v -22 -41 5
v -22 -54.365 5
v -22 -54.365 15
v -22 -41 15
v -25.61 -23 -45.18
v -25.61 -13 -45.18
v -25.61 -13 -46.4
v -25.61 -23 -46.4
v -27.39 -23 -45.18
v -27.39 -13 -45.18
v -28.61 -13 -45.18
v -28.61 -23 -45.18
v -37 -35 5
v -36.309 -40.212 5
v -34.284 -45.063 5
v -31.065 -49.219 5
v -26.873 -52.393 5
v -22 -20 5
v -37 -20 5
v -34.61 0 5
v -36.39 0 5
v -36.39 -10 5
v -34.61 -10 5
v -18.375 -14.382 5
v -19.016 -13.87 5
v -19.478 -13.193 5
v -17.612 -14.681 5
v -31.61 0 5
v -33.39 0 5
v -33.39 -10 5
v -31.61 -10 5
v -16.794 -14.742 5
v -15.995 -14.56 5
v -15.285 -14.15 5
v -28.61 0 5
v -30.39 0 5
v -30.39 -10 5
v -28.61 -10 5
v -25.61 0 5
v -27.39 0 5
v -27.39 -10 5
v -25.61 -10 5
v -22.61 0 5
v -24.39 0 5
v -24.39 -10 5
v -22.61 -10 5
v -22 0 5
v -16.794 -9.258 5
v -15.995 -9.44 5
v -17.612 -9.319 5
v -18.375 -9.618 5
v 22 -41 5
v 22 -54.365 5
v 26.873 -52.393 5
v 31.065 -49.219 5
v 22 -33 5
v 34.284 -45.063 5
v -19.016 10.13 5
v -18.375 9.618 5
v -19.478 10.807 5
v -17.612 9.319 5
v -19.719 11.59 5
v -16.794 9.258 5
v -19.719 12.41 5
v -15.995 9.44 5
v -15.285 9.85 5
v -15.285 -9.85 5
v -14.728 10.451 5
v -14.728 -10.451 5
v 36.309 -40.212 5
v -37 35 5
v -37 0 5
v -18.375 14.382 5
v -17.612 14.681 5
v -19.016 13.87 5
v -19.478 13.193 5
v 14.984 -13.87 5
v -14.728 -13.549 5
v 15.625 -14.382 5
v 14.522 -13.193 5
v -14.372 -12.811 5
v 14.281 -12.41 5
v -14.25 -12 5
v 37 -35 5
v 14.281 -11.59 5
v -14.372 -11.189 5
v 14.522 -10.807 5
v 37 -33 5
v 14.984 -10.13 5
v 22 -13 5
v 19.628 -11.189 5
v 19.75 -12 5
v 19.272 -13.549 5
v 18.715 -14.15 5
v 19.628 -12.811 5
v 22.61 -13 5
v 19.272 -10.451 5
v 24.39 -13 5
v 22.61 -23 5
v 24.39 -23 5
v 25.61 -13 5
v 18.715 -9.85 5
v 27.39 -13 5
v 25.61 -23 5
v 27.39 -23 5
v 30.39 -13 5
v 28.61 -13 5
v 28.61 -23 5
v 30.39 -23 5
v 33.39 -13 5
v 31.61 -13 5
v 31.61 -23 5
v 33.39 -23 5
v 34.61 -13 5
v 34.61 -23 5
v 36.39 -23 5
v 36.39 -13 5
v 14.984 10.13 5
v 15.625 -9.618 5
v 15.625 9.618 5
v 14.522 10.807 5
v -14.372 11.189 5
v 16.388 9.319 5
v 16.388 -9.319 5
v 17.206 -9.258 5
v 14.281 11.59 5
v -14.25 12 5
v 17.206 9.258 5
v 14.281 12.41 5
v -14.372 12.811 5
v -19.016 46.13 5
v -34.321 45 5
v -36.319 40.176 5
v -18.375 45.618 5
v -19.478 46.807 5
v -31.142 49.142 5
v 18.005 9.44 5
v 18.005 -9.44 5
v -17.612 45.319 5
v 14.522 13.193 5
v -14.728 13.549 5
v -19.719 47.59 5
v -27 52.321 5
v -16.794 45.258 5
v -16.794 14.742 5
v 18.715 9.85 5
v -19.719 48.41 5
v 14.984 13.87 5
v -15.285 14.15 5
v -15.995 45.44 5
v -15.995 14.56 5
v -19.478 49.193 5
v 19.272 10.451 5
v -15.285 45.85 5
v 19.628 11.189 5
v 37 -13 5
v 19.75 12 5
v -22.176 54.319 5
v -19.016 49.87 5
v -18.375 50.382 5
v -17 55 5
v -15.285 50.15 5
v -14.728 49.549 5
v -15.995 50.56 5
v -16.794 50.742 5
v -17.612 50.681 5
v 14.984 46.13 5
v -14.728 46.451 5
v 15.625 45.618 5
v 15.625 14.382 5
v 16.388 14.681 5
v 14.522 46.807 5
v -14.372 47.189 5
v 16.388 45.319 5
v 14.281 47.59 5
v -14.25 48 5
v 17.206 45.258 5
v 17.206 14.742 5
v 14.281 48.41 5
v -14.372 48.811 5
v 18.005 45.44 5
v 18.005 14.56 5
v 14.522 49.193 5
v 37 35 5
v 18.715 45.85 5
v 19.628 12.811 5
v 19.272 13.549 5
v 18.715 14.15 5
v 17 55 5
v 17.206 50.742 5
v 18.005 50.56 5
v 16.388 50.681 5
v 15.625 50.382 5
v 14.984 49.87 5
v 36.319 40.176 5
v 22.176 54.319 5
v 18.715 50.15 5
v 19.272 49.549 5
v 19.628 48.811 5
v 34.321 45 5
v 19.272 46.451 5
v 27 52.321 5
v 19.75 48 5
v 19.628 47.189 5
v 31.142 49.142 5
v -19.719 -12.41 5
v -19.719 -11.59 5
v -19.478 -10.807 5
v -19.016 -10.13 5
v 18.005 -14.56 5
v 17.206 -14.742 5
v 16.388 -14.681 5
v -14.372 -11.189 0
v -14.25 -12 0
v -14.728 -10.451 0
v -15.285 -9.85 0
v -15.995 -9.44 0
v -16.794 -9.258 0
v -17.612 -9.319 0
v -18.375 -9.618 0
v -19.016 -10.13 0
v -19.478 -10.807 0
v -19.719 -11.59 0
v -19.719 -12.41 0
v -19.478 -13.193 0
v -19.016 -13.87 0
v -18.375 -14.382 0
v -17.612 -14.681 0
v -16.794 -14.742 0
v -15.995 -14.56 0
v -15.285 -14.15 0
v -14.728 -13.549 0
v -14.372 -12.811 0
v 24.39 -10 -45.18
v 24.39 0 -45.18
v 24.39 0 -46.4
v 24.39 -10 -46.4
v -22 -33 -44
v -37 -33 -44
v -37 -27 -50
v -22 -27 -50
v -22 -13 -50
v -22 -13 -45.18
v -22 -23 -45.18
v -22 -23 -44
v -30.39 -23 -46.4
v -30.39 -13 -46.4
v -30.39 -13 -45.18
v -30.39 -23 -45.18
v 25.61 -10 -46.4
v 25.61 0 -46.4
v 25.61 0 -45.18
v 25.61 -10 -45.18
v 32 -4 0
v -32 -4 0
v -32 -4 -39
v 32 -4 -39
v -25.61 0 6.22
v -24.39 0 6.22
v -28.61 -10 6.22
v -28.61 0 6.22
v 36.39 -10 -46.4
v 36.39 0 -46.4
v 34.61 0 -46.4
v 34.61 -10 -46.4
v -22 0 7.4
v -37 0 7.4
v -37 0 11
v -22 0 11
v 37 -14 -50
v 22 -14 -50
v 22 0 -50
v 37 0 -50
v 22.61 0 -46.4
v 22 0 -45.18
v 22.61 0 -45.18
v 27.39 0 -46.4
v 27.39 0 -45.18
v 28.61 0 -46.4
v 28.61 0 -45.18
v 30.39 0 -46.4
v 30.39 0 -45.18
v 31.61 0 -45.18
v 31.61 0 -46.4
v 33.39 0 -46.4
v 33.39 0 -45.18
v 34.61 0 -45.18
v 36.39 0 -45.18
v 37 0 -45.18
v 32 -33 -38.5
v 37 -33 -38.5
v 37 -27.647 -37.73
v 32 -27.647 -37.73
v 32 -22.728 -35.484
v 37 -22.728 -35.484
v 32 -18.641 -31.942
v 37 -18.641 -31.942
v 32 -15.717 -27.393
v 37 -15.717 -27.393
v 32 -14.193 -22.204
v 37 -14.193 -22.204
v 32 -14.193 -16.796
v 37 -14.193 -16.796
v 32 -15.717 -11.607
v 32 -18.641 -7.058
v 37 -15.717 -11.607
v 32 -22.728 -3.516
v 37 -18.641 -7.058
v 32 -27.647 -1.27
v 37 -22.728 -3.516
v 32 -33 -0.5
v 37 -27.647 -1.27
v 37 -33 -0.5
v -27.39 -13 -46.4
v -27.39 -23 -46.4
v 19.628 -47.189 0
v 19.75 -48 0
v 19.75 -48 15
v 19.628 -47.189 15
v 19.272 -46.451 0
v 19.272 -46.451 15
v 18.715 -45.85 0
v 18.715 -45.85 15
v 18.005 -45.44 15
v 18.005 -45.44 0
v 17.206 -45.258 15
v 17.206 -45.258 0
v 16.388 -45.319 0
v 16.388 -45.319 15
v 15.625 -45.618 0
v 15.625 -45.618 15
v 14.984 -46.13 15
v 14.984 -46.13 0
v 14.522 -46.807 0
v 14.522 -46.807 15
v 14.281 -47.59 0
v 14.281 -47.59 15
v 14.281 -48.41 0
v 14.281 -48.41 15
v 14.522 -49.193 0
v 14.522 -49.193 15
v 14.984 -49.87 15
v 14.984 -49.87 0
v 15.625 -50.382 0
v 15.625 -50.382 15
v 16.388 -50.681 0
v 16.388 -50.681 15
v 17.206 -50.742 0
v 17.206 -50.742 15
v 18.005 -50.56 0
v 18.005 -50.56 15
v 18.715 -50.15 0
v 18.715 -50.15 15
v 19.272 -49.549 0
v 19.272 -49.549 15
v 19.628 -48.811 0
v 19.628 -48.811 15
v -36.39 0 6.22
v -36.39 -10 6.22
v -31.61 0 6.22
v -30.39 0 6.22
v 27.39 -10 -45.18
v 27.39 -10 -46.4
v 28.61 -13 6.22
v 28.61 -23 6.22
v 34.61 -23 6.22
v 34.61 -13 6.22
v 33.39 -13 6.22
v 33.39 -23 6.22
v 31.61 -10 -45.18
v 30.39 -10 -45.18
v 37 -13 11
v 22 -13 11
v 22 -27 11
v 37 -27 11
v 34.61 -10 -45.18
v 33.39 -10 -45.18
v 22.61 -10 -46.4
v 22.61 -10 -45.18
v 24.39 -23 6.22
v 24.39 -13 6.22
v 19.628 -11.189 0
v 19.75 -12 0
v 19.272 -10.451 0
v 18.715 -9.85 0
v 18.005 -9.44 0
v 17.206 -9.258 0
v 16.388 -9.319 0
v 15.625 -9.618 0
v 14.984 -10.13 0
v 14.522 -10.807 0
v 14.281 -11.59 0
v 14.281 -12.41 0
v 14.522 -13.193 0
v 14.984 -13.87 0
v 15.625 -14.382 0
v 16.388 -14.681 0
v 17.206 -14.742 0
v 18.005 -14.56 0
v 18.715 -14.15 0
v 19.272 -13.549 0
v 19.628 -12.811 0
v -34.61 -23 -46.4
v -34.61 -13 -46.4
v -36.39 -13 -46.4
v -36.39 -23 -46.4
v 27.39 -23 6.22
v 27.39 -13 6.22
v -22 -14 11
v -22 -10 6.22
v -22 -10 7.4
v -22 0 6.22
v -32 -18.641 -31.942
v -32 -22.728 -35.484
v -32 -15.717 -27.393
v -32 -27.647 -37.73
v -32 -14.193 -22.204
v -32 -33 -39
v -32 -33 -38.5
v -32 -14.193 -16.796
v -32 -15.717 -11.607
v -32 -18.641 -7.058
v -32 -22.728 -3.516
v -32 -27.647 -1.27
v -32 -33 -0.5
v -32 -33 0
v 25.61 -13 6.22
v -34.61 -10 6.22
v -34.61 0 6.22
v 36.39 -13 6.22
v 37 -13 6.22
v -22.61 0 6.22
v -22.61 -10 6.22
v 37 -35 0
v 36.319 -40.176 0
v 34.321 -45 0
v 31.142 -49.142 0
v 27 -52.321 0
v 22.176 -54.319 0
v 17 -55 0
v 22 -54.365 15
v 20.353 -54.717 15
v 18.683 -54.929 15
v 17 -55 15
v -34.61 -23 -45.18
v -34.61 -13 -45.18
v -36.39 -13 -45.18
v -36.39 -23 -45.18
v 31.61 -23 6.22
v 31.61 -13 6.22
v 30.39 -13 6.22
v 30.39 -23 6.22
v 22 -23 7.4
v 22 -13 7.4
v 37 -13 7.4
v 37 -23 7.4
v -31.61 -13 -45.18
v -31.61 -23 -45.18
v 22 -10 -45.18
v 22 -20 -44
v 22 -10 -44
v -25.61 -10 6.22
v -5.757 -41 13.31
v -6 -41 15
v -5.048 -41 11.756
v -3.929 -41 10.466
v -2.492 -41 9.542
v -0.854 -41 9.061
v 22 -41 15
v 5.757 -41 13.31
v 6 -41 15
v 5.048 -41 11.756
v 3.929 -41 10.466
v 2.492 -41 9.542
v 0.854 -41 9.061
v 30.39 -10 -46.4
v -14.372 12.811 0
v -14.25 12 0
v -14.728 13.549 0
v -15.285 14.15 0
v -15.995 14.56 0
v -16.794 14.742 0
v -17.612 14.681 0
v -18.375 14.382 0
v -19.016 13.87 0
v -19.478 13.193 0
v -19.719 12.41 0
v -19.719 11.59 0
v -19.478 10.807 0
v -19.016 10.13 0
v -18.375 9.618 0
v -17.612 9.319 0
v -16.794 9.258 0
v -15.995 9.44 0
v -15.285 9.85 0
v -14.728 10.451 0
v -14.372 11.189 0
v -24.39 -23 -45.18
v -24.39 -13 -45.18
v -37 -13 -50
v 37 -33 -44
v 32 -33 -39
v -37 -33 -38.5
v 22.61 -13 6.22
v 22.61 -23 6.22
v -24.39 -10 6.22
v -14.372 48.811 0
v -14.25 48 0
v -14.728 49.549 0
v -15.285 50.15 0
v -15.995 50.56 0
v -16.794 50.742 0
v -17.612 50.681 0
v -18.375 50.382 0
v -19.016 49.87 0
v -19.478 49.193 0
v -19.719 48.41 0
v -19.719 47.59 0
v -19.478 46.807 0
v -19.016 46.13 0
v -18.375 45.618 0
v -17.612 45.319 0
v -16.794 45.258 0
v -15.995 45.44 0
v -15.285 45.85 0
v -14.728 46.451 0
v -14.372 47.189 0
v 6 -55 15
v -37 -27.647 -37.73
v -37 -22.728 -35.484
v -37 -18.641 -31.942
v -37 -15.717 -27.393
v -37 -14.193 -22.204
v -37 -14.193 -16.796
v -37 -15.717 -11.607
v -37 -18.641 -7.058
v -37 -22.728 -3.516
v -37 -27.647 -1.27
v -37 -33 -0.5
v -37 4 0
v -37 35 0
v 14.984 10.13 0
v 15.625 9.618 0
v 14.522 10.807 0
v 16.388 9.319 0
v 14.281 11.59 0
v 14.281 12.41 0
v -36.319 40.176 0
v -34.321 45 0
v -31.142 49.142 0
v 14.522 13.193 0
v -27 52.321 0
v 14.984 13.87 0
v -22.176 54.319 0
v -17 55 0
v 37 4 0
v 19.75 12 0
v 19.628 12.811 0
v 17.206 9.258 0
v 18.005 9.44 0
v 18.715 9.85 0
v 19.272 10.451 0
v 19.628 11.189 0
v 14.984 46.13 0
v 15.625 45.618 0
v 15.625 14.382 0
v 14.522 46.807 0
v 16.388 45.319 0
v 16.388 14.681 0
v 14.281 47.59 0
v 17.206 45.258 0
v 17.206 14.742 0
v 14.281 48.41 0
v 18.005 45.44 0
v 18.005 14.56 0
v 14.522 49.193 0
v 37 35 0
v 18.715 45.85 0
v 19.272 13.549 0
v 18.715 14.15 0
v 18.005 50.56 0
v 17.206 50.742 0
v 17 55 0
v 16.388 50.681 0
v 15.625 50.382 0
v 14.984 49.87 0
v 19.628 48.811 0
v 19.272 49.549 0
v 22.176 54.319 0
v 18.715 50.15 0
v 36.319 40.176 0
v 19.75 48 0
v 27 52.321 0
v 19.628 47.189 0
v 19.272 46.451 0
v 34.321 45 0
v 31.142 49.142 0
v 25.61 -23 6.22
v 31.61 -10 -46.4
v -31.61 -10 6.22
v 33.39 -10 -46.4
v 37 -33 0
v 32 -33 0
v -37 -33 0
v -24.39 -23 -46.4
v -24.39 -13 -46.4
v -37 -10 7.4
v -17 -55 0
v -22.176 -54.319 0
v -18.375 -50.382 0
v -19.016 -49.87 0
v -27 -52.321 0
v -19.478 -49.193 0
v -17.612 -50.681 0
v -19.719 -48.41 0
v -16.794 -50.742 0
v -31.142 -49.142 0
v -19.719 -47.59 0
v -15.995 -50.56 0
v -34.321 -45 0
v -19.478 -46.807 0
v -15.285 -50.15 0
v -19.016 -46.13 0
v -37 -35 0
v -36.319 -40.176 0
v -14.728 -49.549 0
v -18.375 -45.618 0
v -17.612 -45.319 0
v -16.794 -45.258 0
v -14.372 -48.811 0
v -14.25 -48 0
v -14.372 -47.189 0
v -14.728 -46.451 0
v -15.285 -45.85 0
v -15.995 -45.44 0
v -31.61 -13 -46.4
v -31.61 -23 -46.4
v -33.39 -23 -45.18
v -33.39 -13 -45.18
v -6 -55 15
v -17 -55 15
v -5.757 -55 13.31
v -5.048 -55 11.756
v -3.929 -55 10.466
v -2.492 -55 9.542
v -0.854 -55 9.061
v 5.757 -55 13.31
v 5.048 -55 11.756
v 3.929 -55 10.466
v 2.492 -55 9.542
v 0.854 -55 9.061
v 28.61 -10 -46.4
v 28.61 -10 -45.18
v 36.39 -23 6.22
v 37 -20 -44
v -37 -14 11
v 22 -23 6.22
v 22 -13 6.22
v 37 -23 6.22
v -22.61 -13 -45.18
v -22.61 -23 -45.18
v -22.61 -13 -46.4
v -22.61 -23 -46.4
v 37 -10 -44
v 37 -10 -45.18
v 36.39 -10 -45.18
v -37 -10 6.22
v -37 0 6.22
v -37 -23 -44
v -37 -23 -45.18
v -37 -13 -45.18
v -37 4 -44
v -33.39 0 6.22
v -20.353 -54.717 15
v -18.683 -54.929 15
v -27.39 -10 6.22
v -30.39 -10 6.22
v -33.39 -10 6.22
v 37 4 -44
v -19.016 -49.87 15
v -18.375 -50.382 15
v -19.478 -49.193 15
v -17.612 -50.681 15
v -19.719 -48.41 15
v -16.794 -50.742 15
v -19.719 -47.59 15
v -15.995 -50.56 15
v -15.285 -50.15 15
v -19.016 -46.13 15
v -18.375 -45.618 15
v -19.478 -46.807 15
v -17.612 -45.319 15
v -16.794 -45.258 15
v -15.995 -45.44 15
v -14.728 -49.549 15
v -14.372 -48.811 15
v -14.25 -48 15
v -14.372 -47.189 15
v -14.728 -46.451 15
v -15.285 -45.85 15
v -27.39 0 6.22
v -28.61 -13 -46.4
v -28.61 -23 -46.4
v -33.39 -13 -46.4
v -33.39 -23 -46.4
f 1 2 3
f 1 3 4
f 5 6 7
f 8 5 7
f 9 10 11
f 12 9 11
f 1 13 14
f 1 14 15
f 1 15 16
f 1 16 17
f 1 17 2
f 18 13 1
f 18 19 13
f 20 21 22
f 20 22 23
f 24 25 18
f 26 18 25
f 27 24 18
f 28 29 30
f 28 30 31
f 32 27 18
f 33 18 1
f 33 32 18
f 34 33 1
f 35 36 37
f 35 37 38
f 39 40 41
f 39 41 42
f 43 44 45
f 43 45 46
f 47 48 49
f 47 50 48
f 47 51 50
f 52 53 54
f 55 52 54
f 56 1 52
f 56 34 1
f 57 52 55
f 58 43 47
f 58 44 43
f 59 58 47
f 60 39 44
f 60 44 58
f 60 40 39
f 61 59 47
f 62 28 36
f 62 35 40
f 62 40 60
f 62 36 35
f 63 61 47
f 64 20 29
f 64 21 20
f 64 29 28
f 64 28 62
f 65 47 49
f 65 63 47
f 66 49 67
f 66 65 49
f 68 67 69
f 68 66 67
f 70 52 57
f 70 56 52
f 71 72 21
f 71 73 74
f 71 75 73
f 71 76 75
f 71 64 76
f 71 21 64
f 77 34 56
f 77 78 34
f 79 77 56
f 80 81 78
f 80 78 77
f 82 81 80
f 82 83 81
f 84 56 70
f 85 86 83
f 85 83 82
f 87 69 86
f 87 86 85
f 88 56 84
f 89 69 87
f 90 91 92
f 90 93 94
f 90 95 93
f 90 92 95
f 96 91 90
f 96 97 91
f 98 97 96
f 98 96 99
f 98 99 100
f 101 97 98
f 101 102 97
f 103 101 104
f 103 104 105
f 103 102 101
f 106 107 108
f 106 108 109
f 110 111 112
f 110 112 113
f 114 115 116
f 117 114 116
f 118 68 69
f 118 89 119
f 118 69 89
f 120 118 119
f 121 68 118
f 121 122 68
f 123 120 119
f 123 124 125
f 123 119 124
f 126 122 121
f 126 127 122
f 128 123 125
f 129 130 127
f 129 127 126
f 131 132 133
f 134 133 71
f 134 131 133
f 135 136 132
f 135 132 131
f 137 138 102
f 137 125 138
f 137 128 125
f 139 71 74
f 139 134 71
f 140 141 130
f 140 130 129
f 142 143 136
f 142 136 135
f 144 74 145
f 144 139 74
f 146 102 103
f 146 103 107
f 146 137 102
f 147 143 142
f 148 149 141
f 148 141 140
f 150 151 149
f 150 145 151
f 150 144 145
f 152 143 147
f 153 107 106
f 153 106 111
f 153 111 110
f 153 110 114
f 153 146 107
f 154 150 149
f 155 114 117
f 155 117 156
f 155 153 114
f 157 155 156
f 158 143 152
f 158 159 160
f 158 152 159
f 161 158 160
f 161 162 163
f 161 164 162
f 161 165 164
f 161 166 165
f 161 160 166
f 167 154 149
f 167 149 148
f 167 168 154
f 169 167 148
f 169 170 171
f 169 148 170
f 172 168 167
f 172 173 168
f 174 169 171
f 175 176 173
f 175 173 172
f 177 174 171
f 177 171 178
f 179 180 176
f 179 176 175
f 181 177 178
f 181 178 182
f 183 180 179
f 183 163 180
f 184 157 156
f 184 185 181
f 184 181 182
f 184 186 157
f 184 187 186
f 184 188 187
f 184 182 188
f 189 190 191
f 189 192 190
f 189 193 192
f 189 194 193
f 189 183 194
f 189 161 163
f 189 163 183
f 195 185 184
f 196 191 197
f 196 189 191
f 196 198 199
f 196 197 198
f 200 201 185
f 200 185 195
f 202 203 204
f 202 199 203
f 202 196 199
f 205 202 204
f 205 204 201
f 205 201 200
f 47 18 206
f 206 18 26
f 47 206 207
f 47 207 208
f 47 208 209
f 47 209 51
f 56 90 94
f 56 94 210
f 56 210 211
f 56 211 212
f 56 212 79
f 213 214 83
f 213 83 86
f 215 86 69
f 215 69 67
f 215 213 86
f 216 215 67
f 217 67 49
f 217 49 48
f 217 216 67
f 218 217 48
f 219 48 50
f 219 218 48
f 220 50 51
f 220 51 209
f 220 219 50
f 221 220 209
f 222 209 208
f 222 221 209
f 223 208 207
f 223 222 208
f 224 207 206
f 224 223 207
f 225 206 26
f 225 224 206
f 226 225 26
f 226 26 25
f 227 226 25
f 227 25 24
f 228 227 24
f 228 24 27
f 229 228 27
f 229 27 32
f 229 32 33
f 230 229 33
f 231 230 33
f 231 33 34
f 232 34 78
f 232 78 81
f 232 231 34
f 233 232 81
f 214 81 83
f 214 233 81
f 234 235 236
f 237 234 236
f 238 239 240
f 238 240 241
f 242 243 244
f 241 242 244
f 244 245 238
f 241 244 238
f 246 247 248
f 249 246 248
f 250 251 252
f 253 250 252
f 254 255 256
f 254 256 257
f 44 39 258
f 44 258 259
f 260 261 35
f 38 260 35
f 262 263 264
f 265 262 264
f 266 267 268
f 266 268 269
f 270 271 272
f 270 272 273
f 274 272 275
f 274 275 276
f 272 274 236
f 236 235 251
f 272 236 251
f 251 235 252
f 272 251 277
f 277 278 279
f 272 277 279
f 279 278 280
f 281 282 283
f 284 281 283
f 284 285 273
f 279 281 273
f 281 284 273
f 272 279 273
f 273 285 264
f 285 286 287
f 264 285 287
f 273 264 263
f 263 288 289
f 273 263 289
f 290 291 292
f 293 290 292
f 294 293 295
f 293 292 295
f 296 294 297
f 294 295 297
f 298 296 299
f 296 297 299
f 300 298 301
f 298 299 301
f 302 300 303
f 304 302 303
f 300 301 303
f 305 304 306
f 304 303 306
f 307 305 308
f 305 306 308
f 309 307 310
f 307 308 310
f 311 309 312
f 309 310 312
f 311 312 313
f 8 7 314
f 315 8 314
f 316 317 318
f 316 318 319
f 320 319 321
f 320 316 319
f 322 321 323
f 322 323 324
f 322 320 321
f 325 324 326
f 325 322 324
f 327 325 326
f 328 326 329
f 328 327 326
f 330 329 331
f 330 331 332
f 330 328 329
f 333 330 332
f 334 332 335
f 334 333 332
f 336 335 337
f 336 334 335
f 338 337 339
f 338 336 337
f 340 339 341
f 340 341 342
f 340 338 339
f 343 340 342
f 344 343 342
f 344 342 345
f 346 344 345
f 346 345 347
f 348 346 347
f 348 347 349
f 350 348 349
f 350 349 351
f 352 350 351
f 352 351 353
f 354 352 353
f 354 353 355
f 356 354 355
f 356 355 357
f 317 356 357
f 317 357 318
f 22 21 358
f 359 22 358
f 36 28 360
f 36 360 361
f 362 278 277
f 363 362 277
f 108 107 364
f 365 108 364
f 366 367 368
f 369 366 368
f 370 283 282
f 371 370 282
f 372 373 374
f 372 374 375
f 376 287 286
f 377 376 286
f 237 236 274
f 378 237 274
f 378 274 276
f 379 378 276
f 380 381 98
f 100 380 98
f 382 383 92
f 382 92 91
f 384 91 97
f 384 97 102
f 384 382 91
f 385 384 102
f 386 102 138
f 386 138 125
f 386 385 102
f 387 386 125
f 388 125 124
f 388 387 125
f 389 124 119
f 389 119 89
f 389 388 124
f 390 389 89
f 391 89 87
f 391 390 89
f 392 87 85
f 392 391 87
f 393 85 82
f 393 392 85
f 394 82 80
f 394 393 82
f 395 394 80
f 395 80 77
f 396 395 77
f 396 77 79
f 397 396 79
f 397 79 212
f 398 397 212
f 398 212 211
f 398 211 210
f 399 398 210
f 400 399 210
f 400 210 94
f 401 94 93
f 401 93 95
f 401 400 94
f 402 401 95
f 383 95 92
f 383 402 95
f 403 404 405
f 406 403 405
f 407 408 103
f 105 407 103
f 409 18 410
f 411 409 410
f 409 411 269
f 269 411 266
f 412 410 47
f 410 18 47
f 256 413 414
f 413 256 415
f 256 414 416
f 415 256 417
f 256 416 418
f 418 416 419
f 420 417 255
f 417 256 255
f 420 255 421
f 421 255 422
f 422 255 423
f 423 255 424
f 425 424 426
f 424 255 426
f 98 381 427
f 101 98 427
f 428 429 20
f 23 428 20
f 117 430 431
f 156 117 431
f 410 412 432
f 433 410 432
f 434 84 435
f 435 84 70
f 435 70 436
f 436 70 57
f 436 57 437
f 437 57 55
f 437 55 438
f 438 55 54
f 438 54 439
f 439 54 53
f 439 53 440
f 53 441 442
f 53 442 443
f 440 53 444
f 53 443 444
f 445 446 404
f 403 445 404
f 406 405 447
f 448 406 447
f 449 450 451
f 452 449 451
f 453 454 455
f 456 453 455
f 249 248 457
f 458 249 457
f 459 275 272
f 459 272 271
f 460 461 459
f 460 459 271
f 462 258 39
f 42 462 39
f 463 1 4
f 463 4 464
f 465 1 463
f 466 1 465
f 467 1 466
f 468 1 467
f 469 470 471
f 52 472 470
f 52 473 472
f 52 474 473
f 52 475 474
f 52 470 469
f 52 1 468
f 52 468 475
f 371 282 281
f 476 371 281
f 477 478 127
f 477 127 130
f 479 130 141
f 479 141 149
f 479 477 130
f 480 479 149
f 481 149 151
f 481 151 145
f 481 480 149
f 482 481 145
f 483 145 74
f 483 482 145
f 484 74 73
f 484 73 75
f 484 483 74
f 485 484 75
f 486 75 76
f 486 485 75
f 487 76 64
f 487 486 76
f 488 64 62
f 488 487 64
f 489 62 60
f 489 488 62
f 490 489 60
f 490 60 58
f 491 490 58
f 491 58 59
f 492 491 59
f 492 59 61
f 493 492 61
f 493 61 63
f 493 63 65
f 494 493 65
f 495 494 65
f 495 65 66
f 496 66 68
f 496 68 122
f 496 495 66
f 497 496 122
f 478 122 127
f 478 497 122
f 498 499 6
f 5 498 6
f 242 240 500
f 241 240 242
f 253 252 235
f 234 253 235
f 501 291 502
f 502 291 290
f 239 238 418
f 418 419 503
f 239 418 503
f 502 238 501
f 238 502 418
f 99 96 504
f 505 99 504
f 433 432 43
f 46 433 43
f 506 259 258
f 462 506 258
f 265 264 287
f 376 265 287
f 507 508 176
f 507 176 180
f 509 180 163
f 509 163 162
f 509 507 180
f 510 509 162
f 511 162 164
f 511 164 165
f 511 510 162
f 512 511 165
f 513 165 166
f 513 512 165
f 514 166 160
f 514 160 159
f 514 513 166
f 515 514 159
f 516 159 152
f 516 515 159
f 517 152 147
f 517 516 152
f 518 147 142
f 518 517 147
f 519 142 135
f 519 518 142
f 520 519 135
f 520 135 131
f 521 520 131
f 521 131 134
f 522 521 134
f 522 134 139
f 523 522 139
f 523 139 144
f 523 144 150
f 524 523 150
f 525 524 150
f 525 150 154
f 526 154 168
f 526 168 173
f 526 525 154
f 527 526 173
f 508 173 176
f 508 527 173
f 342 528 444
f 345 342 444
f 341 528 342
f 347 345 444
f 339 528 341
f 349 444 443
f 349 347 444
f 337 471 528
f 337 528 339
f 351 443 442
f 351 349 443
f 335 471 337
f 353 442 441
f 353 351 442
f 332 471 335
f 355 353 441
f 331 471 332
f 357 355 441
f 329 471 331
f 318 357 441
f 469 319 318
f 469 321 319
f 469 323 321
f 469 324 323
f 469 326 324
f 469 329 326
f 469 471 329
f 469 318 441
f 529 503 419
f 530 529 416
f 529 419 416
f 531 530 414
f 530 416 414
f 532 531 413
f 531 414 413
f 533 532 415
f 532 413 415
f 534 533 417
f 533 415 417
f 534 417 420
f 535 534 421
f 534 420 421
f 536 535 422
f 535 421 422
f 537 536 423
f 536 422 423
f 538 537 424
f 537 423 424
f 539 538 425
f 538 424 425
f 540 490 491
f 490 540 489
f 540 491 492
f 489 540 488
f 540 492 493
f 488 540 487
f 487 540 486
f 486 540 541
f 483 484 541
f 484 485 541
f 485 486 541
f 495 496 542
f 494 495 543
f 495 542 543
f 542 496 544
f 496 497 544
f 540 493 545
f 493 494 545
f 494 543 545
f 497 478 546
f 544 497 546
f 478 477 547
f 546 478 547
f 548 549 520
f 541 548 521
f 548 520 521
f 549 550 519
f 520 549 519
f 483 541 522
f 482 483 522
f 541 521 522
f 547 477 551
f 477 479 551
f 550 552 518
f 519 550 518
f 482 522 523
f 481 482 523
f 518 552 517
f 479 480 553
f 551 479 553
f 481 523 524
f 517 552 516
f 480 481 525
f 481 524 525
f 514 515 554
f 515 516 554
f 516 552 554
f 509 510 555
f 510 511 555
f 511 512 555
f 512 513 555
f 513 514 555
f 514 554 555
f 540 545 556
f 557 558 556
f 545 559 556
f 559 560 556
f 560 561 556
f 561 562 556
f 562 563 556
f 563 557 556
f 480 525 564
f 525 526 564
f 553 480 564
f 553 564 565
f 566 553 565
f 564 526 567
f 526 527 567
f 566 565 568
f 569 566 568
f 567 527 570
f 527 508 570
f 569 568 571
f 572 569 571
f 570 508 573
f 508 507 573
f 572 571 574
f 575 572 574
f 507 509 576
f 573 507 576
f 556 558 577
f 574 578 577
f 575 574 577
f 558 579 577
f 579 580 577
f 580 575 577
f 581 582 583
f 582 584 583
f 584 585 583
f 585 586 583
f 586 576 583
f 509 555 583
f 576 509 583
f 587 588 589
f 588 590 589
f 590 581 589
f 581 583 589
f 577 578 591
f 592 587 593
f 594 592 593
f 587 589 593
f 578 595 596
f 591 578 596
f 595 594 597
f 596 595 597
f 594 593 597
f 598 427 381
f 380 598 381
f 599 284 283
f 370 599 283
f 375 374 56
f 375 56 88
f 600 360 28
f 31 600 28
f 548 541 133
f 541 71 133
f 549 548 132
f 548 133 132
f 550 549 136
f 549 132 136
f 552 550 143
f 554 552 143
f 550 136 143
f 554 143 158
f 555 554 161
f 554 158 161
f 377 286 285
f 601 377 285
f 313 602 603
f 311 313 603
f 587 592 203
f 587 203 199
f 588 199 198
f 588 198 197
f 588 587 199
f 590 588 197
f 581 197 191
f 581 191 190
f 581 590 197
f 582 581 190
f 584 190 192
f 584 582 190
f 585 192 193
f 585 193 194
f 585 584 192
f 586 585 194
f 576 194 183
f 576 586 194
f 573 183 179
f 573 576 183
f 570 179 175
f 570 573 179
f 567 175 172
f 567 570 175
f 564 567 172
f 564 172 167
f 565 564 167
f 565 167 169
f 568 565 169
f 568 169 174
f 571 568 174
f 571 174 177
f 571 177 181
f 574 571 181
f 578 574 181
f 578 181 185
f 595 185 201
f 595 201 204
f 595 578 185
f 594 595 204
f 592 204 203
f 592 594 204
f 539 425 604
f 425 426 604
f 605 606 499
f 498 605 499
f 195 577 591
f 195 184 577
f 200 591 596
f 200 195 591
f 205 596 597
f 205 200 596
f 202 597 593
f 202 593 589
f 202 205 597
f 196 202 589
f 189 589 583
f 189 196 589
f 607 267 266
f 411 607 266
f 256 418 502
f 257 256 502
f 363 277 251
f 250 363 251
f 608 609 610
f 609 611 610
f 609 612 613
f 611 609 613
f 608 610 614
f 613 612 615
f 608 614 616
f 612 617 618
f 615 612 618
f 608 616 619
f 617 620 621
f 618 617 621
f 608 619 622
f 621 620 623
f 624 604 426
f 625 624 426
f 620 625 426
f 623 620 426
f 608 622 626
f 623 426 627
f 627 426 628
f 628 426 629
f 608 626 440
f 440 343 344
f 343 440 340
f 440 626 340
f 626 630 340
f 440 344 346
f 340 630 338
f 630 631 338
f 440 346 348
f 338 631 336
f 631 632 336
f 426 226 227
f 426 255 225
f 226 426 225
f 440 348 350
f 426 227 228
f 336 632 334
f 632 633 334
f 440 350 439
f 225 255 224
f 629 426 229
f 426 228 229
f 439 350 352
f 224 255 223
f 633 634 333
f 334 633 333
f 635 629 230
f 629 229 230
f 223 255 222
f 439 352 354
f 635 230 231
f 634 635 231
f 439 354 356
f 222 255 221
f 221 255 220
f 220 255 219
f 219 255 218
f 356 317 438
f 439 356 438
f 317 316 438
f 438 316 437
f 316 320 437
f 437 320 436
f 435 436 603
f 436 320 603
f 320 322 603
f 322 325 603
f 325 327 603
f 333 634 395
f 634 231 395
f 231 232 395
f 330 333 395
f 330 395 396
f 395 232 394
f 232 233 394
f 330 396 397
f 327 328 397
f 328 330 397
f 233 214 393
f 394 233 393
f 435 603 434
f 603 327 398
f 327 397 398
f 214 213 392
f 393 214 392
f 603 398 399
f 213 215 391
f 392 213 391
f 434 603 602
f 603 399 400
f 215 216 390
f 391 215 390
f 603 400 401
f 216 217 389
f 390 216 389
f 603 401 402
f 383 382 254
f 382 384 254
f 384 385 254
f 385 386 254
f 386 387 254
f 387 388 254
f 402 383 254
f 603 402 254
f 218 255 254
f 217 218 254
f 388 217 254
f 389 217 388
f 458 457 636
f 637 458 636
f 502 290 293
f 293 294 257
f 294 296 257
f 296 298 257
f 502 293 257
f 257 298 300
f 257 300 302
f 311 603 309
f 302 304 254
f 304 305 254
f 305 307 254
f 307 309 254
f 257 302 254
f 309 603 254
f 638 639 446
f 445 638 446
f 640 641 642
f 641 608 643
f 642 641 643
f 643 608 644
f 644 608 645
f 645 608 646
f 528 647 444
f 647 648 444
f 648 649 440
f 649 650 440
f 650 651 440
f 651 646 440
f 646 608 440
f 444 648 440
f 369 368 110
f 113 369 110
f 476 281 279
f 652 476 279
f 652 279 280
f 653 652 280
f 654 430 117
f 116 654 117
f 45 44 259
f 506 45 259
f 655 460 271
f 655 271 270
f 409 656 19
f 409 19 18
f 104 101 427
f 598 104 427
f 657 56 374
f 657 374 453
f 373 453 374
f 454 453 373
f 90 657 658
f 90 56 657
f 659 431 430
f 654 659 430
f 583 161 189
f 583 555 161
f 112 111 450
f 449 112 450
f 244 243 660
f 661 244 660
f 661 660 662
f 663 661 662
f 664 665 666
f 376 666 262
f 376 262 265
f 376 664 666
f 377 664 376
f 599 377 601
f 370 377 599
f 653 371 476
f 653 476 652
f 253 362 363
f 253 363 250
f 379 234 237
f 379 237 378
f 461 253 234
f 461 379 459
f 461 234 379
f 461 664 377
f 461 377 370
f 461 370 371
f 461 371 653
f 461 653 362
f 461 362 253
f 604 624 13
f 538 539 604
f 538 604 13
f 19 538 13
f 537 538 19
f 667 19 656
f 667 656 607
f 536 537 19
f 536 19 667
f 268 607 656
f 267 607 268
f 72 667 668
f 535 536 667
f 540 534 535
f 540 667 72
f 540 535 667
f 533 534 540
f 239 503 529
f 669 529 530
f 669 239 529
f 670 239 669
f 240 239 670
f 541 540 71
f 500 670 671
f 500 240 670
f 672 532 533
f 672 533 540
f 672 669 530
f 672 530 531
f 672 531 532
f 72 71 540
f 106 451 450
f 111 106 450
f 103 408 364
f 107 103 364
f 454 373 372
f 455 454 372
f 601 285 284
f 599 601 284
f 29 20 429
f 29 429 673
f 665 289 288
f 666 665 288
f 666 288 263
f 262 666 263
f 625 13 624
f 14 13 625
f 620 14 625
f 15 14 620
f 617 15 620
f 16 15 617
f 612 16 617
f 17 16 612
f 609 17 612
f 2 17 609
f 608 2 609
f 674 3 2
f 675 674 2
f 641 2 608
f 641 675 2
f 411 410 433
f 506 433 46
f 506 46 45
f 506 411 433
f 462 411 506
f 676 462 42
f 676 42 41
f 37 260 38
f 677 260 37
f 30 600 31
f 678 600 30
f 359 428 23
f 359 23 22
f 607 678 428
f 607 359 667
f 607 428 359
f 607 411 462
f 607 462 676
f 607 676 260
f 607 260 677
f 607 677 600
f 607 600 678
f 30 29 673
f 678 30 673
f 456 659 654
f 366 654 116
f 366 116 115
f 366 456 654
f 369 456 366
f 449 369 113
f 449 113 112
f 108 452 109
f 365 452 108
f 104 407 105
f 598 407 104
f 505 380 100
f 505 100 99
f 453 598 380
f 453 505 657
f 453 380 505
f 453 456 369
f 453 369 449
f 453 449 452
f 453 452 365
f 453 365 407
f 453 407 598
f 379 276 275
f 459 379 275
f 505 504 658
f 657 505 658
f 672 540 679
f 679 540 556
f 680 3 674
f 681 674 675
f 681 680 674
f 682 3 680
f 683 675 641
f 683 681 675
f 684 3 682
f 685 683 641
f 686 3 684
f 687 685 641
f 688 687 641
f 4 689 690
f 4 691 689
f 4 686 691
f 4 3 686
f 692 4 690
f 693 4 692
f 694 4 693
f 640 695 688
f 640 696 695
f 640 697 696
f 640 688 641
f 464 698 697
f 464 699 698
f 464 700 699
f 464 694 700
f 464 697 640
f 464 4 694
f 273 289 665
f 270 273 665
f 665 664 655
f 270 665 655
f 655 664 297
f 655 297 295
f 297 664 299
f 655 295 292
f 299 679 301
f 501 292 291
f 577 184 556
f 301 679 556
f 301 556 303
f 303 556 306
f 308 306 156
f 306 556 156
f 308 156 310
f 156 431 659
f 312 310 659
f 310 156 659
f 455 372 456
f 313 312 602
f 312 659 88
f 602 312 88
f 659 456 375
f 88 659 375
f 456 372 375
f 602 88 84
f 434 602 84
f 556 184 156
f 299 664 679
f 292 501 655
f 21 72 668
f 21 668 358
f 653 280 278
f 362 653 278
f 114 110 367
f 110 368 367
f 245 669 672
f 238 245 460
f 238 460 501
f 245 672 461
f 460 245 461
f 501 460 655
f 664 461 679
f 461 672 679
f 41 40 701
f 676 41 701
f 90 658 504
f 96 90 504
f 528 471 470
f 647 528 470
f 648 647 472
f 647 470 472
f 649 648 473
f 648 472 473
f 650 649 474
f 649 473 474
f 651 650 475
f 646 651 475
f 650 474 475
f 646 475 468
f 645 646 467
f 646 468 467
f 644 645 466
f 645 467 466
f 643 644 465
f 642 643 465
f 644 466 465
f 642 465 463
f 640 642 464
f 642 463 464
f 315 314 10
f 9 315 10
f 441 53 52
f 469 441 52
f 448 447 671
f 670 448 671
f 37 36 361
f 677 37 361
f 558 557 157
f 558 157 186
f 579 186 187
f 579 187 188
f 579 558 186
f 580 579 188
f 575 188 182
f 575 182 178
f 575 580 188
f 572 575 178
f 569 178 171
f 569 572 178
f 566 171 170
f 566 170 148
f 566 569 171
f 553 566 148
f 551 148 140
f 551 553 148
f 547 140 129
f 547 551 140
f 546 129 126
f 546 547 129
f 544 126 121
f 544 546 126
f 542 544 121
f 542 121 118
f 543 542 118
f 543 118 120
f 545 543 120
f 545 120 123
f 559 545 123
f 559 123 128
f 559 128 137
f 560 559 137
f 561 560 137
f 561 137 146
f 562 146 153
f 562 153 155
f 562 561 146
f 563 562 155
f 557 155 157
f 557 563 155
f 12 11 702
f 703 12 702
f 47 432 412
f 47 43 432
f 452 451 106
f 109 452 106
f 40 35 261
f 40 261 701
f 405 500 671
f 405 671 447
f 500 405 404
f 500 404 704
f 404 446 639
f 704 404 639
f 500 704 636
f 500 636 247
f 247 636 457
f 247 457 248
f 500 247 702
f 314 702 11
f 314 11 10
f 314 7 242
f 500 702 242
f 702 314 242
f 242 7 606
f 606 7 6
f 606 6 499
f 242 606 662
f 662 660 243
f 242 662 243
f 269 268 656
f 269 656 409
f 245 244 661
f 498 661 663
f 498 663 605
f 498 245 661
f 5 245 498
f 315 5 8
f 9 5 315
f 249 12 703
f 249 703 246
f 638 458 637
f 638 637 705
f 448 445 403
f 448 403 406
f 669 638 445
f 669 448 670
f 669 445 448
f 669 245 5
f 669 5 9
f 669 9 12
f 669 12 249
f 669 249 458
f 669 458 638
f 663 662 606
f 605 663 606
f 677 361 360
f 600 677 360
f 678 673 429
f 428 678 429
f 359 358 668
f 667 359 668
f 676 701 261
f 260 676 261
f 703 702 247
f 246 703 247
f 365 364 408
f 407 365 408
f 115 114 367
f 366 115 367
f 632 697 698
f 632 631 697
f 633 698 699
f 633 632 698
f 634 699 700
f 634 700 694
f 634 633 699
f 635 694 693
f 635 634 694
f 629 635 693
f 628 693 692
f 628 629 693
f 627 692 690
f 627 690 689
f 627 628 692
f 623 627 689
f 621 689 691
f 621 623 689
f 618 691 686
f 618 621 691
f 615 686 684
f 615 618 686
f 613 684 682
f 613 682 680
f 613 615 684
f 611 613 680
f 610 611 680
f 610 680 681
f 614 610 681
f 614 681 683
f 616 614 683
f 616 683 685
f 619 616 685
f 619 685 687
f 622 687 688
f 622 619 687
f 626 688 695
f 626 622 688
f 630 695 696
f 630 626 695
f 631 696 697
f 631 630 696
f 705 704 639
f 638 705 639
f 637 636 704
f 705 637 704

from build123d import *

# Parameters (mm, degrees)
F0_R      = 2.75
F1_DEPTH  = 5
F2_W      = 15
F2_H      = 20
F3_DEPTH  = 6
F4_DEPTH  = 5
F5_W      = 15
F5_H      = 20
F6_DEPTH  = 11
F8_W      = 44
F8_H      = 8
F9_DEPTH  = 39
F10_W     = 15
F10_H     = 20
F11_DEPTH = 11
F13_W     = 44
F13_H     = 37
F13_W_2   = 15
F14_DEPTH = 5
F15_DEPTH = 10
F16_W     = 15
F16_H     = 20
F17_DEPTH = 6
F18_DEPTH = 5
F20_DEPTH = 10
F21_SIZE  = 5.99999
F22_W     = 15
F22_H     = 13
F22_H_2   = 4
F22_H_3   = 17
F23_DEPTH = 5
F24_W     = 10
F24_H     = 8
F25_DEPTH = 39
F26_DEPTH = 10
F27_W     = 44
F27_H     = 14
F28_DEPTH = 10
F30_DEPTH = 14
F31_DEPTH = 15
F32_R     = 19
F33_DEPTH = 74
F35_DEPTH = 10
F36_W     = 15
F36_H     = 51
F36_H_2   = 22
F37_DEPTH = 5
F38_R     = 20


# Not quite as in the source:
# - a fillet or chamfer is up to 0.001 mm smaller than in the source, because OpenCascade refuses the exact size


with BuildPart() as f1:
    # F0 (on Top) → F1 (new body)
    with BuildSketch(Plane.XY):
        Polygon((0, 55), (-22, 55), (-22, -55), (0, -55), (22, -55), (22, 55), align=None)
        with Locations((-17, -48)):
            Circle(F0_R, mode=Mode.SUBTRACT)
        with Locations((-17, -12)):
            Circle(F0_R, mode=Mode.SUBTRACT)
        with Locations((17, -48)):
            Circle(F0_R, mode=Mode.SUBTRACT)
        with Locations((17, -12)):
            Circle(F0_R, mode=Mode.SUBTRACT)
        with Locations((-17, 12)):
            Circle(F0_R, mode=Mode.SUBTRACT)
        with Locations((-17, 48)):
            Circle(F0_R, mode=Mode.SUBTRACT)
        with Locations((17, 12)):
            Circle(F0_R, mode=Mode.SUBTRACT)
        with Locations((17, 48)):
            Circle(F0_R, mode=Mode.SUBTRACT)
    extrude(amount=F1_DEPTH)



with BuildPart() as f3:
    # F2 (on face) → F3 (new body)
    with BuildSketch(Plane.XY.offset(5)):
        with Locations((29.5, -23)):
            Rectangle(F2_W, F2_H)
    extrude(amount=F3_DEPTH)


with BuildPart() as f1_1:
    add(f1.part)
    # F4 (add): a face of the model
    f4_faces = [f3.part.faces().sort_by_distance(p)[0] for p in [
        (29.5, -23, 5),
    ]]

    add(f3.part)  # F4 merges F3
    extrude(f4_faces, amount=F4_DEPTH)

    # F5 (on Top) → F6 (join)
    with BuildSketch(Plane.XY):
        with Locations((-29.5, -10)):
            Rectangle(F5_W, F5_H)
    extrude(amount=F6_DEPTH)

    # F8 (on face) → F9 (join)
    with BuildSketch(Plane.XY):
        Rectangle(F8_W, F8_H)
    extrude(amount=-F9_DEPTH)

    # F10 (on face) → F11 (join)
    with BuildSketch(Plane(origin=(0, 0, -39), x_dir=(1, 0, 0), z_dir=(0, 0, -1))):
        with Locations((29.5, 10)):
            Rectangle(F10_W, F10_H)
    extrude(amount=F11_DEPTH)

    # F13 (on face) → F14 (join)
    with BuildSketch(Plane(origin=(0, 0, -39), x_dir=(1, 0, 0), z_dir=(0, 0, -1))):
        with Locations((0, 14.5)):
            Rectangle(F13_W, F13_H)
        with Locations((29.5, 14.5)):
            Rectangle(F13_W_2, F13_H)
        with Locations((-29.5, 14.5)):
            Rectangle(F13_W_2, F13_H)
    extrude(amount=F14_DEPTH)

    # F12 (on face) → F15 (cut)
    with BuildSketch(Plane(origin=(0, 0, 0), x_dir=(-1, 0, 0), z_dir=(0, 1, 0))):
        Polygon((-36.39, -45.18), (-36.39, -46.4), (-34.61, -46.4), (-34.61, -45.18), (-33.39, -45.18), (-33.39, -46.4), (-31.61, -46.4), (-31.61, -45.18), (-30.39, -45.18), (-30.39, -46.4), (-28.61, -46.4), (-28.61, -45.18), (-27.39, -45.18), (-27.39, -46.4), (-25.61, -46.4), (-25.61, -45.18), (-24.39, -45.18), (-24.39, -46.4), (-22.61, -46.4), (-22.61, -45.18), (-22, -45.18), (-22, -44), (-37, -44), (-37, -45.18), align=None)
    extrude(amount=-F15_DEPTH, mode=Mode.SUBTRACT)



with BuildPart() as f17:
    # F16 (on face) → F17 (new body)
    with BuildSketch(Plane(origin=(0, 0, -44), x_dir=(1, 0, 0), z_dir=(0, 0, -1))):
        with Locations((-29.5, 23)):
            Rectangle(F16_W, F16_H)
    extrude(amount=F17_DEPTH)


with BuildPart() as f1_2:
    add(f1_1.part)
    # F18 (add): a face of the model
    f18_faces = [f17.part.faces().sort_by_distance(p)[0] for p in [
        (-29.5, -23, -44),
    ]]

    add(f17.part)  # F18 merges F17
    extrude(f18_faces, amount=F18_DEPTH)

    # F19 (on face) → F20 (cut)
    with BuildSketch(Plane(origin=(0, -13, 0), x_dir=(-1, 0, 0), z_dir=(0, 1, 0))):
        Polygon((22.61, -45.18), (22.61, -46.4), (24.39, -46.4), (24.39, -45.18), (25.61, -45.18), (25.61, -46.4), (27.39, -46.4), (27.39, -45.18), (28.61, -45.18), (28.61, -46.4), (30.39, -46.4), (30.39, -45.18), (31.61, -45.18), (31.61, -46.4), (33.39, -46.4), (33.39, -45.18), (34.61, -45.18), (34.61, -46.4), (36.39, -46.4), (36.39, -45.18), (37, -45.18), (37, -44), (22, -44), (22, -45.18), align=None)
    extrude(amount=-F20_DEPTH, mode=Mode.SUBTRACT)

    # F21 (size 6 in the source; OpenCascade refuses exactly that, so slightly less here)
    f21_edges = [f1_2.edges().sort_by_distance(p)[0] for p in [
        (-29.5, -20, 11),
        (29.5, -33, 11),
        (29.5, -20, -50),
        (-29.5, -33, -50),
    ]]
    chamfer(f21_edges, length=F21_SIZE)

    # F22 (on Top) → F23 (join)
    with BuildSketch(Plane.XY):
        with Locations((-29.5, -26.5)):
            Rectangle(F22_W, F22_H)
        with Locations((-29.5, 2)):
            Rectangle(F22_W, F22_H_2)
        with Locations((29.5, -4.5)):
            Rectangle(F22_W, F22_H_3)
    extrude(amount=F23_DEPTH)

    # F24 (on face) → F25 (join)
    with BuildSketch(Plane(origin=(0, 0, 0), x_dir=(1, 0, 0), z_dir=(0, 0, -1))):
        Polygon((32, -4), (37, -4), (37, 33), (32, 33), (32, 4), align=None)
        with Locations((27, 0)):
            Rectangle(F24_W, F24_H)
        Polygon((-37, 33), (-37, -4), (-32, -4), (-32, 4), (-32, 33), align=None)
        with Locations((-27, 0)):
            Rectangle(F24_W, F24_H)
    extrude(amount=F25_DEPTH)

    # F7 (on face) → F26 (cut)
    with BuildSketch(Plane(origin=(0, 0, 0), x_dir=(-1, 0, 0), z_dir=(0, 1, 0))):
        Polygon((22.61, 6.22), (22.61, 5), (24.39, 5), (24.39, 6.22), (25.61, 6.22), (25.61, 5), (27.39, 5), (27.39, 6.22), (28.61, 6.22), (28.61, 5), (30.39, 5), (30.39, 6.22), (31.61, 6.22), (31.61, 5), (33.39, 5), (33.39, 6.22), (34.61, 6.22), (34.61, 5), (36.39, 5), (36.39, 6.22), (37, 6.22), (37, 7.4), (22, 7.4), (22, 6.22), align=None)
    extrude(amount=-F26_DEPTH, mode=Mode.SUBTRACT)

    # F27 (on face) → F28 (join)
    with BuildSketch(Plane.XY.offset(5)):
        with Locations((0, -48)):
            Rectangle(F27_W, F27_H)
    extrude(amount=F28_DEPTH)

    # F29 (on face) → F30 (cut)
    with BuildSketch(Plane(origin=(0, -41, 0), x_dir=(-1, 0, 0), z_dir=(0, 1, 0))):
        with BuildLine():
            Line((-6, 15), (6, 15))
            ThreePointArc((6, 15), (0, 21), (-6, 15))
        make_face()
        with BuildLine():
            ThreePointArc((-6, 15), (0, 9), (6, 15))
            Line((6, 15), (-6, 15))
        make_face()
    extrude(amount=-F30_DEPTH, mode=Mode.SUBTRACT)

    # F0 (on Top) → F31 (cut)
    with BuildSketch(Plane.XY):
        with Locations((-17, -48)):
            Circle(F0_R)
        with Locations((17, -48)):
            Circle(F0_R)
    extrude(amount=F31_DEPTH, mode=Mode.SUBTRACT)

    # F32 (on face) → F33 (cut)
    with BuildSketch(Plane.YZ.offset(37)):
        with Locations((-33, -19.5)):
            Circle(F32_R)
    extrude(amount=-F33_DEPTH, mode=Mode.SUBTRACT)

    # F34 (on face) → F35 (cut)
    with BuildSketch(Plane(origin=(0, -13, 0), x_dir=(-1, 0, 0), z_dir=(0, 1, 0))):
        Polygon((-36.39, 6.22), (-36.39, 5), (-34.61, 5), (-34.61, 6.22), (-33.39, 6.22), (-33.39, 5), (-31.61, 5), (-31.61, 6.22), (-30.39, 6.22), (-30.39, 5), (-28.61, 5), (-28.61, 6.22), (-27.39, 6.22), (-27.39, 5), (-25.61, 5), (-25.61, 6.22), (-24.39, 6.22), (-24.39, 5), (-22.61, 5), (-22.61, 6.22), (-22, 6.22), (-22, 7.4), (-37, 7.4), (-37, 6.22), align=None)
    extrude(amount=-F35_DEPTH, mode=Mode.SUBTRACT)

    # F36 (on Top) → F37 (join)
    with BuildSketch(Plane.XY):
        with Locations((-29.5, 29.5)):
            Rectangle(F36_W, F36_H)
        with Locations((29.5, 29.5)):
            Rectangle(F36_W, F36_H)
        with Locations((-29.5, -44)):
            Rectangle(F36_W, F36_H_2)
        with Locations((29.5, -44)):
            Rectangle(F36_W, F36_H_2)
    extrude(amount=F37_DEPTH)

    # F38
    f38_edges = [f1_2.edges().sort_by_distance(p)[0] for p in [
        (-37, -55, 2.5),
        (37, -55, 2.5),
        (37, 55, 2.5),
        (-37, 55, 2.5),
    ]]
    fillet(f38_edges, radius=F38_R)


solid = f1_2.part
